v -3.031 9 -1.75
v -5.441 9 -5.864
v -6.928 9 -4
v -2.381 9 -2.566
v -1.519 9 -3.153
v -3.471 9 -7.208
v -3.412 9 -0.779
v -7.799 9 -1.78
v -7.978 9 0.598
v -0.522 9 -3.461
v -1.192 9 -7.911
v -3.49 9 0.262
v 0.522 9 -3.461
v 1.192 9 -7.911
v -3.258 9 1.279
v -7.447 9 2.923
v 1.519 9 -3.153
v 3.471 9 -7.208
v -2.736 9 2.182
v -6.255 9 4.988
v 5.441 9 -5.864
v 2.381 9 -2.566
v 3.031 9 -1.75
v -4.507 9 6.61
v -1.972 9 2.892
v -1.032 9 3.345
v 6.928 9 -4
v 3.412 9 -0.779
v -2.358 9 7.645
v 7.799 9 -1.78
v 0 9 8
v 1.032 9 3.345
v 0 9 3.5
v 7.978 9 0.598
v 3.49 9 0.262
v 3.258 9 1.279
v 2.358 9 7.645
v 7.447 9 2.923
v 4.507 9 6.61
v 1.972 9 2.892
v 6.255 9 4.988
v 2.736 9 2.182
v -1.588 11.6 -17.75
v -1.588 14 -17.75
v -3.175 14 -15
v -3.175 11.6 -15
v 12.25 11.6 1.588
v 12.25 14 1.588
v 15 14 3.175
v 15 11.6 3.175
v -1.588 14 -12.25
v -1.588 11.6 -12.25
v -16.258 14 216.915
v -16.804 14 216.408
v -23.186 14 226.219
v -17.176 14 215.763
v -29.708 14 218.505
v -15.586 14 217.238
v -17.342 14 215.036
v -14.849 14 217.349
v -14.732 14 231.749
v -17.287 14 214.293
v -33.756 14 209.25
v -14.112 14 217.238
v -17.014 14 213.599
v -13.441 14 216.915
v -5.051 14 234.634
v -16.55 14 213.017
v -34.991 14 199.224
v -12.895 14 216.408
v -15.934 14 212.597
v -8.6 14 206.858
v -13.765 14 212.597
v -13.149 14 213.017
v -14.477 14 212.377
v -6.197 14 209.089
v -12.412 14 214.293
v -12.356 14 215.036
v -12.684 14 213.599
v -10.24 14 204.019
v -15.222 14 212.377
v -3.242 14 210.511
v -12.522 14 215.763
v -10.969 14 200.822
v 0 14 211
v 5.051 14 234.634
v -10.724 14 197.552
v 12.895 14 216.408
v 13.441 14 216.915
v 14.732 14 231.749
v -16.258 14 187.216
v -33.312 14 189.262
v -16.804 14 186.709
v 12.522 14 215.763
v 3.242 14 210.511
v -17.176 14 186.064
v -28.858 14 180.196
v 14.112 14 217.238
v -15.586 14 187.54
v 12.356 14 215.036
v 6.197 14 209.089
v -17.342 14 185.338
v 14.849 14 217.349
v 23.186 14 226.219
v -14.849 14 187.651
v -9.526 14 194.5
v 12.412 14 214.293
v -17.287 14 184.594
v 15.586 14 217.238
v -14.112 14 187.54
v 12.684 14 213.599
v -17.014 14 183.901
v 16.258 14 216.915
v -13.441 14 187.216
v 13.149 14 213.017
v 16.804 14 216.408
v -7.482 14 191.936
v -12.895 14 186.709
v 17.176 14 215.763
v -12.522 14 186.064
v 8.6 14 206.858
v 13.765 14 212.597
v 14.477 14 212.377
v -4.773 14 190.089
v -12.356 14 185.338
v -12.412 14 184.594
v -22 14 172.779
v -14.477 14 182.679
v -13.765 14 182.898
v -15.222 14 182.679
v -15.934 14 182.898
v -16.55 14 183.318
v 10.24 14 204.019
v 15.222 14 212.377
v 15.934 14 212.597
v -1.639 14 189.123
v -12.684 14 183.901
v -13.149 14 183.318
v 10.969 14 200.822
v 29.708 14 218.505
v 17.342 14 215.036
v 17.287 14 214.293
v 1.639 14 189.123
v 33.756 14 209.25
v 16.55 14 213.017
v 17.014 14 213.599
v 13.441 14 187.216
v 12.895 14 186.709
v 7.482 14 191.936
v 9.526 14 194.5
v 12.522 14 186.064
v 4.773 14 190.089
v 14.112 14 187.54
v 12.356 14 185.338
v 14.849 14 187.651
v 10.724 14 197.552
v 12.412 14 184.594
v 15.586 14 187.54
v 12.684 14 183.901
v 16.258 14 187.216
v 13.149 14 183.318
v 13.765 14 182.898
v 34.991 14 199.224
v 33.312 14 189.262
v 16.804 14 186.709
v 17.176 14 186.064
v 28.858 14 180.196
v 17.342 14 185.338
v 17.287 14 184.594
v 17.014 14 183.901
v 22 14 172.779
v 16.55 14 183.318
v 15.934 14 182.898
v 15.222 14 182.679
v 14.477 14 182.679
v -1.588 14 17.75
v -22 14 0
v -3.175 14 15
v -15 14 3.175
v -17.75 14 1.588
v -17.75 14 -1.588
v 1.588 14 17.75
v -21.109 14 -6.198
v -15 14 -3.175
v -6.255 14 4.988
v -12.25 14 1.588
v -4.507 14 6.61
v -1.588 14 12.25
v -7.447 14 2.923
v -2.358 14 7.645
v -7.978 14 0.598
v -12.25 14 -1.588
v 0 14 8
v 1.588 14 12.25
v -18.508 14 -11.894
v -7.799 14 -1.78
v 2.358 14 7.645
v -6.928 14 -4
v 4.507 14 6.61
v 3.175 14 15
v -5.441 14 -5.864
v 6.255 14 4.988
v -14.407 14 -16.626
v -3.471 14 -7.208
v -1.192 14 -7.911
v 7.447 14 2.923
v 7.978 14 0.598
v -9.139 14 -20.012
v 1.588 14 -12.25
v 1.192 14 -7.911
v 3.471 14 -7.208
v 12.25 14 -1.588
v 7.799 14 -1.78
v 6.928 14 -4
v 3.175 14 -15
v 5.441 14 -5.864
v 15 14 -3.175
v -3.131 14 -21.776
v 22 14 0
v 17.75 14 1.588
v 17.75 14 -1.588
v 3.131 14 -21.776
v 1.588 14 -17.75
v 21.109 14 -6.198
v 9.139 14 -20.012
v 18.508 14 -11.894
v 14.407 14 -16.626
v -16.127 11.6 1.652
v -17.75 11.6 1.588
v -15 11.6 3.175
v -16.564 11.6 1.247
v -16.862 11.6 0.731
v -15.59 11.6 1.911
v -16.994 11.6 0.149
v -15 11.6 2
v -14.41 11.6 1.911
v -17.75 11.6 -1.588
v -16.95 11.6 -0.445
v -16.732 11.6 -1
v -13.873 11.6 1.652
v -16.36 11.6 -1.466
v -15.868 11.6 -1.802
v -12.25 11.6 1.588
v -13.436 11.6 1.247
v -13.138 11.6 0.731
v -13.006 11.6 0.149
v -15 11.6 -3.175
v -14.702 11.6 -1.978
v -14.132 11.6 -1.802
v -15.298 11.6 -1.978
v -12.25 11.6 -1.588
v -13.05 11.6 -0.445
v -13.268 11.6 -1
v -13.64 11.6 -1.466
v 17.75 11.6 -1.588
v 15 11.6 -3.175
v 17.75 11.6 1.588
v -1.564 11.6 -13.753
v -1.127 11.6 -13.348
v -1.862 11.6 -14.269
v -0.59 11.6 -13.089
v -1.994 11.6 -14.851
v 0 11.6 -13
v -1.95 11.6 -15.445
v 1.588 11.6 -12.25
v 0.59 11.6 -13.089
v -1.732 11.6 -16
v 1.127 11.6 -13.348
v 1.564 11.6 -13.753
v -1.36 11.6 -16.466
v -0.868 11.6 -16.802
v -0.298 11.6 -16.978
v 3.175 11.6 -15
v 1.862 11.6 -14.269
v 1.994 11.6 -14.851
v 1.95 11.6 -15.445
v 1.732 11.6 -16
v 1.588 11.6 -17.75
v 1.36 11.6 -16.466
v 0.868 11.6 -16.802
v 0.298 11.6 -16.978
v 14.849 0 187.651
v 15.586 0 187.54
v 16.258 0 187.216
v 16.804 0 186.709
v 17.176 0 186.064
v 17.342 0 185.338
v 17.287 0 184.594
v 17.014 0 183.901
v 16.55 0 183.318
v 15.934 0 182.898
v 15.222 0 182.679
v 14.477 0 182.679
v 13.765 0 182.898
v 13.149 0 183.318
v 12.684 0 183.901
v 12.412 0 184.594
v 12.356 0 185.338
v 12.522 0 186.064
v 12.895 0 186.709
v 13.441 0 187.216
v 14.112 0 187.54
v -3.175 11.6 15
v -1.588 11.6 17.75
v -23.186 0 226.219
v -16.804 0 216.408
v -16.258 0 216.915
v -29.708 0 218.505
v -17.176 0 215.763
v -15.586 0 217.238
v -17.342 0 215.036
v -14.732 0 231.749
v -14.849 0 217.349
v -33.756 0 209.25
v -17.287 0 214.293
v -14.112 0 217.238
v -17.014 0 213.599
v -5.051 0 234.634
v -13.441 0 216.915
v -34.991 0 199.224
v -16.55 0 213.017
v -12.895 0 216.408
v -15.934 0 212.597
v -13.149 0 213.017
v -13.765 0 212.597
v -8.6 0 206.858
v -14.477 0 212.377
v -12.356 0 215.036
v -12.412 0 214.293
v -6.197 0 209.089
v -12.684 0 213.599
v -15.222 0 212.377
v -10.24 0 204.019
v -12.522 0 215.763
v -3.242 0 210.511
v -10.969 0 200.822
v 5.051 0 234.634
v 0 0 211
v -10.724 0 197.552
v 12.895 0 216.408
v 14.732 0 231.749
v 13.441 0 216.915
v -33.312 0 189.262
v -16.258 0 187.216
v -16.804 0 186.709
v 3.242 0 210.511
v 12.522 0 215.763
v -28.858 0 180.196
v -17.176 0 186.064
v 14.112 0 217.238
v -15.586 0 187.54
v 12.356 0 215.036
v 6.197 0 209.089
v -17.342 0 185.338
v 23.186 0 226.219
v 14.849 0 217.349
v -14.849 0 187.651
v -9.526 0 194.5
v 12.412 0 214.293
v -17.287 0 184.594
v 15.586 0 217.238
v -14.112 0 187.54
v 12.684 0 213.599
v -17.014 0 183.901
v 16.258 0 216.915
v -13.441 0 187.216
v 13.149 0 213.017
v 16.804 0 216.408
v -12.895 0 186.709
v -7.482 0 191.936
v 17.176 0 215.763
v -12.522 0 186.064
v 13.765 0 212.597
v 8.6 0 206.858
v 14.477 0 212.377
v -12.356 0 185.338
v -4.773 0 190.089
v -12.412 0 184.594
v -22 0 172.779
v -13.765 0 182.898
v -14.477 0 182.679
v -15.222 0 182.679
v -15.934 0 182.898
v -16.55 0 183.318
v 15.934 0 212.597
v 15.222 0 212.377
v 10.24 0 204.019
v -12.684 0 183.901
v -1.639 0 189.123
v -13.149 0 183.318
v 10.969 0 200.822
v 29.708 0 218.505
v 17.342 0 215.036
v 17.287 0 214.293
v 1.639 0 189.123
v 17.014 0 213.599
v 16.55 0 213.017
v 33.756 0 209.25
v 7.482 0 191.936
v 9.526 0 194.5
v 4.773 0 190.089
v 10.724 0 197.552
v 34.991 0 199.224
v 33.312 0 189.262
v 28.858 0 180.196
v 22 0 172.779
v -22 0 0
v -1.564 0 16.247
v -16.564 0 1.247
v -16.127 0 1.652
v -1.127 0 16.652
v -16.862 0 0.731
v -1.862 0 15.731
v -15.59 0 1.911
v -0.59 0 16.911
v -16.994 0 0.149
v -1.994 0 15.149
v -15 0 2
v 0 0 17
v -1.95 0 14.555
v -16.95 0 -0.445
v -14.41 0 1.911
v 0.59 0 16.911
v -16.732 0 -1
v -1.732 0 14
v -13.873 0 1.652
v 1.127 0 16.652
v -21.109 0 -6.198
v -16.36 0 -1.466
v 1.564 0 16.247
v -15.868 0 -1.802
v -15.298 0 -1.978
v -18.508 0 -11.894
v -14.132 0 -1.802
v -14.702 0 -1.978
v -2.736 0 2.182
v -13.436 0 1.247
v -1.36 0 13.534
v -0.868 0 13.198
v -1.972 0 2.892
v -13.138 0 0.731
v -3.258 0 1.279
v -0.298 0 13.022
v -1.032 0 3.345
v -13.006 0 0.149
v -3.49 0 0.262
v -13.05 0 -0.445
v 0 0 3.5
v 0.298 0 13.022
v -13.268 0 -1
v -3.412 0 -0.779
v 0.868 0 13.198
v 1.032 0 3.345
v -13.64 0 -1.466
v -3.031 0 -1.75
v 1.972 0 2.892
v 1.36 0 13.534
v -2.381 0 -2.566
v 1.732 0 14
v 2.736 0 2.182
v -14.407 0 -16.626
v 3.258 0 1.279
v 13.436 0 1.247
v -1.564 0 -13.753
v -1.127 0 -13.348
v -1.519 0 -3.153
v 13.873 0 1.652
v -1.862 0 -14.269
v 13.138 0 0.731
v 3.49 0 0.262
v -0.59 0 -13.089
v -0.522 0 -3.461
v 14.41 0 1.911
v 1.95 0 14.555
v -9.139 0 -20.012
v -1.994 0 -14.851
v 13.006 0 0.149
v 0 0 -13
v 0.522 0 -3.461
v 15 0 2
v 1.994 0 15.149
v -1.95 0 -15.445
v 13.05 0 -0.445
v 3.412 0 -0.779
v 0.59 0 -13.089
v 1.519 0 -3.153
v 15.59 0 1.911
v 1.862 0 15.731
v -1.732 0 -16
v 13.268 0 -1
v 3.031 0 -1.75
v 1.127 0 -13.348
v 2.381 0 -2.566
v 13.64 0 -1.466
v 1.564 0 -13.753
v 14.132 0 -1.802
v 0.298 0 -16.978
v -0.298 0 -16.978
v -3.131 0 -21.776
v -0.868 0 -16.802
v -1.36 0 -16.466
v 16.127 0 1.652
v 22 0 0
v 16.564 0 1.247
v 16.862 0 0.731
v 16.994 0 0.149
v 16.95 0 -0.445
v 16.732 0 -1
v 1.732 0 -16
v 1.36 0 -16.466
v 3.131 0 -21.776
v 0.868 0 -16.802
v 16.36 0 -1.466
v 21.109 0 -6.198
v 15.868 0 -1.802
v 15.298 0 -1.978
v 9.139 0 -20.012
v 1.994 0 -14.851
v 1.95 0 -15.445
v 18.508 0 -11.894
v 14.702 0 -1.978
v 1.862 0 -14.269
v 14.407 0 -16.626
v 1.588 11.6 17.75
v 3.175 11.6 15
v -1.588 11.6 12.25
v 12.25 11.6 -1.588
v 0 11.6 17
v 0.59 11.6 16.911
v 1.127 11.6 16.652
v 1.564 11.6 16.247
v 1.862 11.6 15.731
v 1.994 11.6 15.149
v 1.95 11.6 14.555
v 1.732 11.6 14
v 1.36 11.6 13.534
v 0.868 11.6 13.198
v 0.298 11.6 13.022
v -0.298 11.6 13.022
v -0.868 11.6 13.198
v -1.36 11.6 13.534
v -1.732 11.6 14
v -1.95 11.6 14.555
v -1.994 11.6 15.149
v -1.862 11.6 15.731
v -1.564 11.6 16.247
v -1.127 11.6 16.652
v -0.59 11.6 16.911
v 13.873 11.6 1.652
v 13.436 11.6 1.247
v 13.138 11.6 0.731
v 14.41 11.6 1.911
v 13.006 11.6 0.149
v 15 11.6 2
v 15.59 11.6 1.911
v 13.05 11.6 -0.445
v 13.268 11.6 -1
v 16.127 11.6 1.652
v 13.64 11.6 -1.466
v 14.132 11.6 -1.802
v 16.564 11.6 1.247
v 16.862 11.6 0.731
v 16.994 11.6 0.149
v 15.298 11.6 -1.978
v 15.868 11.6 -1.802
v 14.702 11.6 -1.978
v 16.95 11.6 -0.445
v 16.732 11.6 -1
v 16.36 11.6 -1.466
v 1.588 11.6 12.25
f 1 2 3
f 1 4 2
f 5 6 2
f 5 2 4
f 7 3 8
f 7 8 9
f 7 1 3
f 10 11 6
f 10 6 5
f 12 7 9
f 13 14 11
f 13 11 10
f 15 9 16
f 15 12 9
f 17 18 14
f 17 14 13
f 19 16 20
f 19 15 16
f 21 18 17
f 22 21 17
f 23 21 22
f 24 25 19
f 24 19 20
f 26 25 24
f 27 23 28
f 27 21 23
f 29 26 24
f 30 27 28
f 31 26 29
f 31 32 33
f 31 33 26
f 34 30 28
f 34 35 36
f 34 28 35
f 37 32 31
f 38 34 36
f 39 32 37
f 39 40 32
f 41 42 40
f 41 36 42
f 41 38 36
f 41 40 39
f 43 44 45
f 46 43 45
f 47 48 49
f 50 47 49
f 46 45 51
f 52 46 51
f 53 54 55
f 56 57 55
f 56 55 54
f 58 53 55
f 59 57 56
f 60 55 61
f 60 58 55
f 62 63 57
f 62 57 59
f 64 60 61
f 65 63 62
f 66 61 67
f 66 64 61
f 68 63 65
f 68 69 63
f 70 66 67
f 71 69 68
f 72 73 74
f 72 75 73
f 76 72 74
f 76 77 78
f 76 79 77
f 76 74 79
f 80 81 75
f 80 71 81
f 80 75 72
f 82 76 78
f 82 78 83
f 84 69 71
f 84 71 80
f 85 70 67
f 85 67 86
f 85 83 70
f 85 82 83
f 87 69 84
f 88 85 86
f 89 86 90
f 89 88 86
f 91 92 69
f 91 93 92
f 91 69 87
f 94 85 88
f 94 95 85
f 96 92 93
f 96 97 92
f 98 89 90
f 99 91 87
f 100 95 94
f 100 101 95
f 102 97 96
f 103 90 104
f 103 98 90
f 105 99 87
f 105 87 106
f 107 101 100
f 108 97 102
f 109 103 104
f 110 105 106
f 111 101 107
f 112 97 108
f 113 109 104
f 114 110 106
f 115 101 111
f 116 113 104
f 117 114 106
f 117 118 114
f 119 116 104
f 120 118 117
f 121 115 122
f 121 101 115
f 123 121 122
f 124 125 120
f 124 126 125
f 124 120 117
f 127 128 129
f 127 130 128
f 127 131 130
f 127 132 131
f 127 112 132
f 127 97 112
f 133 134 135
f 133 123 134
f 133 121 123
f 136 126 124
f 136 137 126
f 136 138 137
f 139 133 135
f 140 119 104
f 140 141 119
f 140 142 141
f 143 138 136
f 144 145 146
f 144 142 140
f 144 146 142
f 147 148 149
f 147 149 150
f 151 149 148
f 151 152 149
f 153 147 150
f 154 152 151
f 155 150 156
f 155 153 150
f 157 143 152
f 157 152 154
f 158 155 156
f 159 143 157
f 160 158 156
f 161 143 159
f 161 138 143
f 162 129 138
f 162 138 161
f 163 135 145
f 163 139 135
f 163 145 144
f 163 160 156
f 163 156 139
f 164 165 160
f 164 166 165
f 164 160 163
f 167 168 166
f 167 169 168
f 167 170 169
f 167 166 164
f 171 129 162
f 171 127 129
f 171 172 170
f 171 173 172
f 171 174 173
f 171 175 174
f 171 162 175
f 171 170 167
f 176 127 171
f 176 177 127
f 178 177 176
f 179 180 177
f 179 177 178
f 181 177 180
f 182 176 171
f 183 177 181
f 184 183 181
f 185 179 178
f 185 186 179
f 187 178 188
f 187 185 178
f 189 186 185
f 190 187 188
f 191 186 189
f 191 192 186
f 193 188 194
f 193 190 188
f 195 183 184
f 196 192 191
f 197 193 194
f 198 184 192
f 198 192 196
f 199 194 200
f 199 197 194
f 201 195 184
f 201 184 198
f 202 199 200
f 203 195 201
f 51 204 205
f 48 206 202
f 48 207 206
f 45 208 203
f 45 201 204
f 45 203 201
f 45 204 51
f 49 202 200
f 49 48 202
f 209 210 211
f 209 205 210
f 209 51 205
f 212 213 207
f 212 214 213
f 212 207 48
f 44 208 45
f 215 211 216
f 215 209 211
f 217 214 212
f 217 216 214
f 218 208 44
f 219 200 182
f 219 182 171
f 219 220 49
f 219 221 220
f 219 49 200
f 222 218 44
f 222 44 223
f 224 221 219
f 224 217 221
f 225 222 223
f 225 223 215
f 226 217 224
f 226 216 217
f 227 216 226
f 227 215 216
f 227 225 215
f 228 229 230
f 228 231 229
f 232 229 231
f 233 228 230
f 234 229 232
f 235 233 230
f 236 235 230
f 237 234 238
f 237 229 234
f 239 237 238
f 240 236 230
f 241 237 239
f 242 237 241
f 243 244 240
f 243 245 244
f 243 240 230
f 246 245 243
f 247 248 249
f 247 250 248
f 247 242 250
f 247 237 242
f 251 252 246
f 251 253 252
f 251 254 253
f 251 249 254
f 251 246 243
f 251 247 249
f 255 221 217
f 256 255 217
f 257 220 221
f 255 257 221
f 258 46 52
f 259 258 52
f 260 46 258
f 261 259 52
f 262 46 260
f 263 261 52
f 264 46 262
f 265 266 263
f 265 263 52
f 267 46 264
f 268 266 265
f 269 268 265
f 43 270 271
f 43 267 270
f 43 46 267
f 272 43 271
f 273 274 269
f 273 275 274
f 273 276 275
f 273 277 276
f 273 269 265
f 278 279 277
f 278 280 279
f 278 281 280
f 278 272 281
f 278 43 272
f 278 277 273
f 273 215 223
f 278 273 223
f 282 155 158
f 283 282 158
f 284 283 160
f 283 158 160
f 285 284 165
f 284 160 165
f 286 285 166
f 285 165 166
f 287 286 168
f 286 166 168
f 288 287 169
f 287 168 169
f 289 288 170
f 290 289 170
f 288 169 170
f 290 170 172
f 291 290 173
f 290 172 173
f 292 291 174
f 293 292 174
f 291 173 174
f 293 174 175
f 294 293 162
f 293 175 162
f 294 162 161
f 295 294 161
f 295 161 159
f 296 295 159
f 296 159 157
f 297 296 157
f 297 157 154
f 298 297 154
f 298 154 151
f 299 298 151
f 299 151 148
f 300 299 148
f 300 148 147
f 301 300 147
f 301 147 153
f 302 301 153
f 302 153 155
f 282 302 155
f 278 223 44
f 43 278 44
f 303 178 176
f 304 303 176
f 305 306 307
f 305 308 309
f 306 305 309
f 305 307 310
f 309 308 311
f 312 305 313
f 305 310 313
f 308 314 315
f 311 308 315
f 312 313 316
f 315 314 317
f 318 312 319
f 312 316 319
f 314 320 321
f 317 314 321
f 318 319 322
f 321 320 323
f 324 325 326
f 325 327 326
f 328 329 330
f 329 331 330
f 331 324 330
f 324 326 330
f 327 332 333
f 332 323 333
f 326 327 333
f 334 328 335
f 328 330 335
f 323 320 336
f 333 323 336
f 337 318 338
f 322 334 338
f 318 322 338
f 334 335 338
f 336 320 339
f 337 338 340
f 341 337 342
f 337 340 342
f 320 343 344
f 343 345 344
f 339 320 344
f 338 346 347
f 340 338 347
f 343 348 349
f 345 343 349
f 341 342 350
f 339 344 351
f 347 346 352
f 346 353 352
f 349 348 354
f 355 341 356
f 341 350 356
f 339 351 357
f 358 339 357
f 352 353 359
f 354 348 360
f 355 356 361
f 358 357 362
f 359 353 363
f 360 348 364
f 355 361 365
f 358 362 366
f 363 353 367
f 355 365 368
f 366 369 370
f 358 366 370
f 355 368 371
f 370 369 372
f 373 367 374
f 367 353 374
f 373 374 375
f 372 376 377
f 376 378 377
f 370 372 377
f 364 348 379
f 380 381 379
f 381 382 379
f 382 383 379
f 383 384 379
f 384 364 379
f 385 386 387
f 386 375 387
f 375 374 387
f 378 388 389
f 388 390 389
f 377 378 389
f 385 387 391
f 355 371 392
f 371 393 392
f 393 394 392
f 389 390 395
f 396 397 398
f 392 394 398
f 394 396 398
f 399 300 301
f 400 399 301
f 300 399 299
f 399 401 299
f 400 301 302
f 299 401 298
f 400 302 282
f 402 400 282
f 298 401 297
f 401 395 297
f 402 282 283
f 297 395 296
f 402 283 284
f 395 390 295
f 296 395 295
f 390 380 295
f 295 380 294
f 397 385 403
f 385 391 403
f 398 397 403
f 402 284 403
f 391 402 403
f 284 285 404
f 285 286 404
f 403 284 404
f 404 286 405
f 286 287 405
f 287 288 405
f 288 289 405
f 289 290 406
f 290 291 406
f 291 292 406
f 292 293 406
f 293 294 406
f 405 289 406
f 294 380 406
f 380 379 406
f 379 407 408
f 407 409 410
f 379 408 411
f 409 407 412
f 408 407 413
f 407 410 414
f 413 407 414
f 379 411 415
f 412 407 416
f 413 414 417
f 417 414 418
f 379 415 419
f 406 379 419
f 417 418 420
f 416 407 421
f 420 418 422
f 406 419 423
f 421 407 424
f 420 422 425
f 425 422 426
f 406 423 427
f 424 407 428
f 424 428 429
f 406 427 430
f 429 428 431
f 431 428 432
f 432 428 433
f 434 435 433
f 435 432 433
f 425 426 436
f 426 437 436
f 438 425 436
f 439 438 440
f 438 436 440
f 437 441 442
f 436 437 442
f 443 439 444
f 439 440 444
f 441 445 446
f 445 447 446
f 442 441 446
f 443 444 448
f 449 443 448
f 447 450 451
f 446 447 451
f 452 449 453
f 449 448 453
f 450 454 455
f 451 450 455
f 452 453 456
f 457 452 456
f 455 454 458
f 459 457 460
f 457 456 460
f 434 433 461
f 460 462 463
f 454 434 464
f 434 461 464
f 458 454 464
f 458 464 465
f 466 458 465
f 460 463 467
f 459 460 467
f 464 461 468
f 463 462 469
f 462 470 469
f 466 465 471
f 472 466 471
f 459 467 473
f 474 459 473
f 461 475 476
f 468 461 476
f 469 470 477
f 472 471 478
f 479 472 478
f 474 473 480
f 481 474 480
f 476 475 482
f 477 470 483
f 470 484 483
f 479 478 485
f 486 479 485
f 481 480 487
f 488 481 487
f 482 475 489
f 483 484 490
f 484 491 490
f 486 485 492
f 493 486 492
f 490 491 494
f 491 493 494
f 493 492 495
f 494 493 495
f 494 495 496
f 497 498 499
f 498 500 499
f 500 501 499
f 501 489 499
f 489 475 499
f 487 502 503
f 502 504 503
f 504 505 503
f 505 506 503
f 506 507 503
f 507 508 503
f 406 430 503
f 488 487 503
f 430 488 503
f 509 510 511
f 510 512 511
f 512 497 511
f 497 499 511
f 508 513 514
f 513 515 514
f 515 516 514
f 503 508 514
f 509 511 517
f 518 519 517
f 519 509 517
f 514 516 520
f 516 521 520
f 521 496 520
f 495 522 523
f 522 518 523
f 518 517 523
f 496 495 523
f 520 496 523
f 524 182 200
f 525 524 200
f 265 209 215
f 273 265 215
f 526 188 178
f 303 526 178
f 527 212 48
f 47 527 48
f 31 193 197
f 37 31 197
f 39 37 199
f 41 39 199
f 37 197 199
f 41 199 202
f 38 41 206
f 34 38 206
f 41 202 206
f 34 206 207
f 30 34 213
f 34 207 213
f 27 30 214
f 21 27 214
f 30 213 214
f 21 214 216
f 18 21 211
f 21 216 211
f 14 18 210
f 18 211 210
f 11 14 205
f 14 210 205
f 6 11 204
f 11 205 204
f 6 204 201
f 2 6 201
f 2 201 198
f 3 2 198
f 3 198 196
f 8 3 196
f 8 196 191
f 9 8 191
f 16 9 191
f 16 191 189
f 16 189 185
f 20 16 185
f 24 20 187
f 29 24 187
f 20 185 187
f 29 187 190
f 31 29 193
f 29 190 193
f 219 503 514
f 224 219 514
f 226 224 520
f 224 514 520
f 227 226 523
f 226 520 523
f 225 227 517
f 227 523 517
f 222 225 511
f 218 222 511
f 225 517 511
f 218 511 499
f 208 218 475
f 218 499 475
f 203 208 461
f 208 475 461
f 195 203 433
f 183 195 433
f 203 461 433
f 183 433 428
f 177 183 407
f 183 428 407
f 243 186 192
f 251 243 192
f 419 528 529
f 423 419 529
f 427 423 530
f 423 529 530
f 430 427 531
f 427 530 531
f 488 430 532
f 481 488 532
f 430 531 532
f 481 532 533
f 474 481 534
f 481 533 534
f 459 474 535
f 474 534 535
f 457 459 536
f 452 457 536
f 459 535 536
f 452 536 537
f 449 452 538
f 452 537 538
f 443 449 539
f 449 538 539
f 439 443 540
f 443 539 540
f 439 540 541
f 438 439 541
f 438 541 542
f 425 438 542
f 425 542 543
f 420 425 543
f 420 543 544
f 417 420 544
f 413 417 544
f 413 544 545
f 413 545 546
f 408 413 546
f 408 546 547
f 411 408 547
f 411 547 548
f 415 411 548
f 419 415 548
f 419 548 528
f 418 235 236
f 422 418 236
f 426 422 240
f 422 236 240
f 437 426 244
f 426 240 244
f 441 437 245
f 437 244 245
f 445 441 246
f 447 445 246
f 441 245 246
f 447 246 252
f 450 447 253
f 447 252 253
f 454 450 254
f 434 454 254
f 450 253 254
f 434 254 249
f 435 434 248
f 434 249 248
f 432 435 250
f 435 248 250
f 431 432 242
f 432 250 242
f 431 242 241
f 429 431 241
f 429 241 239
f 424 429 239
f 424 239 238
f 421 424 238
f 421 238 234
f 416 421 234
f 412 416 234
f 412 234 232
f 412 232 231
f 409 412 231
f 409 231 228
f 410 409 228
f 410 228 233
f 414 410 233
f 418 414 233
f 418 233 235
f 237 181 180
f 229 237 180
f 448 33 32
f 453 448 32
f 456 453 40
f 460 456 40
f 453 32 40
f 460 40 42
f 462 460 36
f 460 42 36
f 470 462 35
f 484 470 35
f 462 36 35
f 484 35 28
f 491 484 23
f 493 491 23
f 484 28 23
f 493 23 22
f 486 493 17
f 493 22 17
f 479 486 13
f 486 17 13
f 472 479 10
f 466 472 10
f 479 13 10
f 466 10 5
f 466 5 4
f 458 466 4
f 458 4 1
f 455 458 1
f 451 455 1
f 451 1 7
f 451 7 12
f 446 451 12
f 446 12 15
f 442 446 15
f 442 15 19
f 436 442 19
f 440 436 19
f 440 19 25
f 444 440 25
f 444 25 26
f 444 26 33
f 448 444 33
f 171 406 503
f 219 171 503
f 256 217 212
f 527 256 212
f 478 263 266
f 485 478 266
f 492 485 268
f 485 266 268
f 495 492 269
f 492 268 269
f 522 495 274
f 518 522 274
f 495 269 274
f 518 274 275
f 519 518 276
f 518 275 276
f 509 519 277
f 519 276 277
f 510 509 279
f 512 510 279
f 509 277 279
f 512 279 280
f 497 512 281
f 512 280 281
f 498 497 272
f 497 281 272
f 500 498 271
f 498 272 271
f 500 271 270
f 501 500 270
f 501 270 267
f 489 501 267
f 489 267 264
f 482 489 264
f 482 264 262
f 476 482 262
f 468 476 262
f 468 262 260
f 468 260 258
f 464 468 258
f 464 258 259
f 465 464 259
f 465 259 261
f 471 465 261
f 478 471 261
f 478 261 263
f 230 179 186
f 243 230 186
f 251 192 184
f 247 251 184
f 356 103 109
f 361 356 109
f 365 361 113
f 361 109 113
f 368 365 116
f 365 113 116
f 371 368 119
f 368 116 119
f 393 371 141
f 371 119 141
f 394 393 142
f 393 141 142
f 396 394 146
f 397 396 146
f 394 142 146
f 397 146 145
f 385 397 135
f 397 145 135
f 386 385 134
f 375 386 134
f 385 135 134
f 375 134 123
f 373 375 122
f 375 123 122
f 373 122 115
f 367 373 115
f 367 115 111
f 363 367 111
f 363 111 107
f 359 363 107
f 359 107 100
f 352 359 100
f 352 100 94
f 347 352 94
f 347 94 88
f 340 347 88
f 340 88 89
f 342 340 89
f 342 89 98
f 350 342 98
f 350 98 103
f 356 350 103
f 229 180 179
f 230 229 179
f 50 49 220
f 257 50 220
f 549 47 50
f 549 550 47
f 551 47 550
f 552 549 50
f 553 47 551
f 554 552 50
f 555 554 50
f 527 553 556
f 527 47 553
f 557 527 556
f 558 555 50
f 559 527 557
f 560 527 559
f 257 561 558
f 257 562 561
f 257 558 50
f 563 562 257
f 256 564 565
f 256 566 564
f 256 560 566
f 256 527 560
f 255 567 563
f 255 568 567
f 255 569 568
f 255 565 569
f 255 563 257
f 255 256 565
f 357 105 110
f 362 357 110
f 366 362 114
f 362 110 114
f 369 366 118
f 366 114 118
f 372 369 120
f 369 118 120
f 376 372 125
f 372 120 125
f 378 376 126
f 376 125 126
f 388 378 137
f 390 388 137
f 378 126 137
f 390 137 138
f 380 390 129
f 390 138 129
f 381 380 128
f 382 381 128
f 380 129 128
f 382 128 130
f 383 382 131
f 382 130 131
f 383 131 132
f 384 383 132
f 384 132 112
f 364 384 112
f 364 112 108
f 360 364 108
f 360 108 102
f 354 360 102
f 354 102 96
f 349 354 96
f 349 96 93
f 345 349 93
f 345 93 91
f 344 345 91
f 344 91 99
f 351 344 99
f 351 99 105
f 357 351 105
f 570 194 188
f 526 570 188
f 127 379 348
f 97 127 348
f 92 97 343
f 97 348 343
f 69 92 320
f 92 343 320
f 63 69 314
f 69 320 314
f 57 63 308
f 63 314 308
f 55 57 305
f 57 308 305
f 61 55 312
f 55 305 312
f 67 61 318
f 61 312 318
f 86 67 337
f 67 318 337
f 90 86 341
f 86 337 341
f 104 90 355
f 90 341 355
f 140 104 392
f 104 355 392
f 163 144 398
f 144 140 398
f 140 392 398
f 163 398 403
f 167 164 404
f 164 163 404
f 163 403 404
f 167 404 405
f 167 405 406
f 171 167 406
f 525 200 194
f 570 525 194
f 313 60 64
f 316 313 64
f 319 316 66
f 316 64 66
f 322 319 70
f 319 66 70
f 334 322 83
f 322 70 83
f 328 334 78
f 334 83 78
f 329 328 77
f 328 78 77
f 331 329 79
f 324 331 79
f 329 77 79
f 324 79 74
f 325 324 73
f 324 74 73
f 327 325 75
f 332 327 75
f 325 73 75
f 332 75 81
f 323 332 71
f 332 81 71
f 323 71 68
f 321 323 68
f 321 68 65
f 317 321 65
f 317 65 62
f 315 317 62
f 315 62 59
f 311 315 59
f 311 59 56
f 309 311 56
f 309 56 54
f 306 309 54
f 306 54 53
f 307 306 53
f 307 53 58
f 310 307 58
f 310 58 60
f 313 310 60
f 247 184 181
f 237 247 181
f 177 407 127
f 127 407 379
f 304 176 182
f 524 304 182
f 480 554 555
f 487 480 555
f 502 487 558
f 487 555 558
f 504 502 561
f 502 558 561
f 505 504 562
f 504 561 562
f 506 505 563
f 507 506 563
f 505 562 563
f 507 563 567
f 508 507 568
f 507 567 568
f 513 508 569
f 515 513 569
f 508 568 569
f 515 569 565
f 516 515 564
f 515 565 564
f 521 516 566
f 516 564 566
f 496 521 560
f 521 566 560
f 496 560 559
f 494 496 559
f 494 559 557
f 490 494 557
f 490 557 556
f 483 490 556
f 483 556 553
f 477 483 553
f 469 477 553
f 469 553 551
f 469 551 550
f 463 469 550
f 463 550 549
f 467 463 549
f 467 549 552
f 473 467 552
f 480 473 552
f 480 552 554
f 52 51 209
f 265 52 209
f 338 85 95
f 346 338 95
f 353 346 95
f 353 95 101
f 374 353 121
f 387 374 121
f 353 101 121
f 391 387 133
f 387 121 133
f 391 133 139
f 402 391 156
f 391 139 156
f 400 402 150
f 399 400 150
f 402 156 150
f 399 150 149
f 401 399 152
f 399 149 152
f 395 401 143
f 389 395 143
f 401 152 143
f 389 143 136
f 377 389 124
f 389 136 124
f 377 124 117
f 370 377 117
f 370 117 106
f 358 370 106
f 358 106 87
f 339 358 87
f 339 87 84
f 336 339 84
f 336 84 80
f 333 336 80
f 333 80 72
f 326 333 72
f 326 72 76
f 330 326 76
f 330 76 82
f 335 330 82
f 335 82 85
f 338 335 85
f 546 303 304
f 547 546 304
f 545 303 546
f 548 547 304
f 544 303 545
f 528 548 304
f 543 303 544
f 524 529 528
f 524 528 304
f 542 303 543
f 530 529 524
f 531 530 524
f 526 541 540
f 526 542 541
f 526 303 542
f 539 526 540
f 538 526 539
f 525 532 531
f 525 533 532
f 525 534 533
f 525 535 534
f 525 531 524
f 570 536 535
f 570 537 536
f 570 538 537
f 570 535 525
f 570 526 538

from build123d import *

# Parameters (mm, degrees)
BOSS_EXTRUDE1_DEPTH = 14
SKETCH2_R           = 8
CUT_EXTRUDE1_DEPTH  = 5
SKETCH3_R           = 3.5
CUT_EXTRUDE2_DEPTH  = 224.526284808
CUT_EXTRUDE9_DEPTH  = 2.4
SKETCH7_R           = 2
CUT_EXTRUDE10_DEPTH = 224.526284808
SKETCH8_R           = 35
BOSS_EXTRUDE2_DEPTH = 14
SKETCH9_R           = 2.5
SKETCH9_R_2         = 11
CUT_EXTRUDE11_DEPTH = 239.004201644


with BuildPart() as part:
    # Sketch1 → Boss-Extrude1 (new body)
    with BuildSketch(Plane(origin=(0, 0, 0), x_dir=(1, 0, 0), z_dir=(0, 1, 0))):
        with BuildLine():
            Line((-22, 0), (-22, -200))
            ThreePointArc((-22, -200), (0, -222), (22, -200))
            Line((22, -200), (22, 0))
            ThreePointArc((22, 0), (0, 22), (-22, 0))
        make_face()
    extrude(amount=BOSS_EXTRUDE1_DEPTH)

    # Sketch2 → Cut-Extrude1 (cut)
    with BuildSketch(Plane(origin=(0, 14, 0), x_dir=(1, 0, 0), z_dir=(0, 1, 0))):
        with Locations(Location((0, 0, 0), (0, 0, 270))):
            Circle(SKETCH2_R)
    extrude(amount=-CUT_EXTRUDE1_DEPTH, mode=Mode.SUBTRACT)

    # Sketch3 → Cut-Extrude2 (cut, through all)
    with BuildSketch(Plane(origin=(0, 14, 0), x_dir=(1, 0, 0), z_dir=(0, 1, 0))):
        with Locations(Location((0, 0, 0), (0, 0, 270))):
            Circle(SKETCH3_R)
    extrude(amount=-CUT_EXTRUDE2_DEPTH, mode=Mode.SUBTRACT)

    # Sketch4 → Cut-Extrude9 (cut)
    with BuildSketch(Plane(origin=(0, 14, 0), x_dir=(1, 0, 0), z_dir=(0, 1, 0))):
        Polygon((15, -3.175426481), (17.75, -1.58771324), (17.75, 1.58771324), (15, 3.175426481), (12.25, 1.58771324), (12.25, -1.58771324), align=None)
        Polygon((3.175426481, 15), (1.58771324, 17.75), (-1.58771324, 17.75), (-3.175426481, 15), (-1.58771324, 12.25), (1.58771324, 12.25), align=None)
        Polygon((-3.175426481, -15), (-1.58771324, -17.75), (1.58771324, -17.75), (3.175426481, -15), (1.58771324, -12.25), (-1.58771324, -12.25), align=None)
        Polygon((-15, 3.175426481), (-17.75, 1.58771324), (-17.75, -1.58771324), (-15, -3.175426481), (-12.25, -1.58771324), (-12.25, 1.58771324), align=None)
    extrude(amount=-CUT_EXTRUDE9_DEPTH, mode=Mode.SUBTRACT)

    # Sketch7 → Cut-Extrude10 (cut, through all)
    with BuildSketch(Plane(origin=(0, 14, 0), x_dir=(1, 0, 0), z_dir=(0, 1, 0))):
        with Locations(Location((0, 15, 0), (0, 0, 270))):
            Circle(SKETCH7_R)
        with Locations(Location((15, 0, 0), (0, 0, 270))):
            Circle(SKETCH7_R)
        with Locations(Location((0, -15, 0), (0, 0, 270))):
            Circle(SKETCH7_R)
        with Locations(Location((-15, 0, 0), (0, 0, 270))):
            Circle(SKETCH7_R)
    extrude(amount=-CUT_EXTRUDE10_DEPTH, mode=Mode.SUBTRACT)

    # Sketch8 → Boss-Extrude2 (add)
    with BuildSketch(Plane(origin=(0, 0, 0), x_dir=(1, 0, 0), z_dir=(0, 1, 0))):
        with Locations((0, -200)):
            Circle(SKETCH8_R)
    extrude(amount=BOSS_EXTRUDE2_DEPTH)

    # Sketch9 → Cut-Extrude11 (cut, through all)
    with BuildSketch(Plane(origin=(0, 14, 0), x_dir=(1, 0, 0), z_dir=(0, 1, 0))):
        with Locations(Location((-14.849242405, -185.150757595, 0), (0, 0, 270))):
            Circle(SKETCH9_R)
        with Locations(Location((14.849242405, -185.150757595, 0), (0, 0, 270))):
            Circle(SKETCH9_R)
        with Locations(Location((14.849242405, -214.849242405, 0), (0, 0, 270))):
            Circle(SKETCH9_R)
        with Locations(Location((-14.849242405, -214.849242405, 0), (0, 0, 270))):
            Circle(SKETCH9_R)
        with Locations(Location((0, -200, 0), (0, 0, 270))):
            Circle(SKETCH9_R_2)
    extrude(amount=-CUT_EXTRUDE11_DEPTH, mode=Mode.SUBTRACT)


solid = part.part
